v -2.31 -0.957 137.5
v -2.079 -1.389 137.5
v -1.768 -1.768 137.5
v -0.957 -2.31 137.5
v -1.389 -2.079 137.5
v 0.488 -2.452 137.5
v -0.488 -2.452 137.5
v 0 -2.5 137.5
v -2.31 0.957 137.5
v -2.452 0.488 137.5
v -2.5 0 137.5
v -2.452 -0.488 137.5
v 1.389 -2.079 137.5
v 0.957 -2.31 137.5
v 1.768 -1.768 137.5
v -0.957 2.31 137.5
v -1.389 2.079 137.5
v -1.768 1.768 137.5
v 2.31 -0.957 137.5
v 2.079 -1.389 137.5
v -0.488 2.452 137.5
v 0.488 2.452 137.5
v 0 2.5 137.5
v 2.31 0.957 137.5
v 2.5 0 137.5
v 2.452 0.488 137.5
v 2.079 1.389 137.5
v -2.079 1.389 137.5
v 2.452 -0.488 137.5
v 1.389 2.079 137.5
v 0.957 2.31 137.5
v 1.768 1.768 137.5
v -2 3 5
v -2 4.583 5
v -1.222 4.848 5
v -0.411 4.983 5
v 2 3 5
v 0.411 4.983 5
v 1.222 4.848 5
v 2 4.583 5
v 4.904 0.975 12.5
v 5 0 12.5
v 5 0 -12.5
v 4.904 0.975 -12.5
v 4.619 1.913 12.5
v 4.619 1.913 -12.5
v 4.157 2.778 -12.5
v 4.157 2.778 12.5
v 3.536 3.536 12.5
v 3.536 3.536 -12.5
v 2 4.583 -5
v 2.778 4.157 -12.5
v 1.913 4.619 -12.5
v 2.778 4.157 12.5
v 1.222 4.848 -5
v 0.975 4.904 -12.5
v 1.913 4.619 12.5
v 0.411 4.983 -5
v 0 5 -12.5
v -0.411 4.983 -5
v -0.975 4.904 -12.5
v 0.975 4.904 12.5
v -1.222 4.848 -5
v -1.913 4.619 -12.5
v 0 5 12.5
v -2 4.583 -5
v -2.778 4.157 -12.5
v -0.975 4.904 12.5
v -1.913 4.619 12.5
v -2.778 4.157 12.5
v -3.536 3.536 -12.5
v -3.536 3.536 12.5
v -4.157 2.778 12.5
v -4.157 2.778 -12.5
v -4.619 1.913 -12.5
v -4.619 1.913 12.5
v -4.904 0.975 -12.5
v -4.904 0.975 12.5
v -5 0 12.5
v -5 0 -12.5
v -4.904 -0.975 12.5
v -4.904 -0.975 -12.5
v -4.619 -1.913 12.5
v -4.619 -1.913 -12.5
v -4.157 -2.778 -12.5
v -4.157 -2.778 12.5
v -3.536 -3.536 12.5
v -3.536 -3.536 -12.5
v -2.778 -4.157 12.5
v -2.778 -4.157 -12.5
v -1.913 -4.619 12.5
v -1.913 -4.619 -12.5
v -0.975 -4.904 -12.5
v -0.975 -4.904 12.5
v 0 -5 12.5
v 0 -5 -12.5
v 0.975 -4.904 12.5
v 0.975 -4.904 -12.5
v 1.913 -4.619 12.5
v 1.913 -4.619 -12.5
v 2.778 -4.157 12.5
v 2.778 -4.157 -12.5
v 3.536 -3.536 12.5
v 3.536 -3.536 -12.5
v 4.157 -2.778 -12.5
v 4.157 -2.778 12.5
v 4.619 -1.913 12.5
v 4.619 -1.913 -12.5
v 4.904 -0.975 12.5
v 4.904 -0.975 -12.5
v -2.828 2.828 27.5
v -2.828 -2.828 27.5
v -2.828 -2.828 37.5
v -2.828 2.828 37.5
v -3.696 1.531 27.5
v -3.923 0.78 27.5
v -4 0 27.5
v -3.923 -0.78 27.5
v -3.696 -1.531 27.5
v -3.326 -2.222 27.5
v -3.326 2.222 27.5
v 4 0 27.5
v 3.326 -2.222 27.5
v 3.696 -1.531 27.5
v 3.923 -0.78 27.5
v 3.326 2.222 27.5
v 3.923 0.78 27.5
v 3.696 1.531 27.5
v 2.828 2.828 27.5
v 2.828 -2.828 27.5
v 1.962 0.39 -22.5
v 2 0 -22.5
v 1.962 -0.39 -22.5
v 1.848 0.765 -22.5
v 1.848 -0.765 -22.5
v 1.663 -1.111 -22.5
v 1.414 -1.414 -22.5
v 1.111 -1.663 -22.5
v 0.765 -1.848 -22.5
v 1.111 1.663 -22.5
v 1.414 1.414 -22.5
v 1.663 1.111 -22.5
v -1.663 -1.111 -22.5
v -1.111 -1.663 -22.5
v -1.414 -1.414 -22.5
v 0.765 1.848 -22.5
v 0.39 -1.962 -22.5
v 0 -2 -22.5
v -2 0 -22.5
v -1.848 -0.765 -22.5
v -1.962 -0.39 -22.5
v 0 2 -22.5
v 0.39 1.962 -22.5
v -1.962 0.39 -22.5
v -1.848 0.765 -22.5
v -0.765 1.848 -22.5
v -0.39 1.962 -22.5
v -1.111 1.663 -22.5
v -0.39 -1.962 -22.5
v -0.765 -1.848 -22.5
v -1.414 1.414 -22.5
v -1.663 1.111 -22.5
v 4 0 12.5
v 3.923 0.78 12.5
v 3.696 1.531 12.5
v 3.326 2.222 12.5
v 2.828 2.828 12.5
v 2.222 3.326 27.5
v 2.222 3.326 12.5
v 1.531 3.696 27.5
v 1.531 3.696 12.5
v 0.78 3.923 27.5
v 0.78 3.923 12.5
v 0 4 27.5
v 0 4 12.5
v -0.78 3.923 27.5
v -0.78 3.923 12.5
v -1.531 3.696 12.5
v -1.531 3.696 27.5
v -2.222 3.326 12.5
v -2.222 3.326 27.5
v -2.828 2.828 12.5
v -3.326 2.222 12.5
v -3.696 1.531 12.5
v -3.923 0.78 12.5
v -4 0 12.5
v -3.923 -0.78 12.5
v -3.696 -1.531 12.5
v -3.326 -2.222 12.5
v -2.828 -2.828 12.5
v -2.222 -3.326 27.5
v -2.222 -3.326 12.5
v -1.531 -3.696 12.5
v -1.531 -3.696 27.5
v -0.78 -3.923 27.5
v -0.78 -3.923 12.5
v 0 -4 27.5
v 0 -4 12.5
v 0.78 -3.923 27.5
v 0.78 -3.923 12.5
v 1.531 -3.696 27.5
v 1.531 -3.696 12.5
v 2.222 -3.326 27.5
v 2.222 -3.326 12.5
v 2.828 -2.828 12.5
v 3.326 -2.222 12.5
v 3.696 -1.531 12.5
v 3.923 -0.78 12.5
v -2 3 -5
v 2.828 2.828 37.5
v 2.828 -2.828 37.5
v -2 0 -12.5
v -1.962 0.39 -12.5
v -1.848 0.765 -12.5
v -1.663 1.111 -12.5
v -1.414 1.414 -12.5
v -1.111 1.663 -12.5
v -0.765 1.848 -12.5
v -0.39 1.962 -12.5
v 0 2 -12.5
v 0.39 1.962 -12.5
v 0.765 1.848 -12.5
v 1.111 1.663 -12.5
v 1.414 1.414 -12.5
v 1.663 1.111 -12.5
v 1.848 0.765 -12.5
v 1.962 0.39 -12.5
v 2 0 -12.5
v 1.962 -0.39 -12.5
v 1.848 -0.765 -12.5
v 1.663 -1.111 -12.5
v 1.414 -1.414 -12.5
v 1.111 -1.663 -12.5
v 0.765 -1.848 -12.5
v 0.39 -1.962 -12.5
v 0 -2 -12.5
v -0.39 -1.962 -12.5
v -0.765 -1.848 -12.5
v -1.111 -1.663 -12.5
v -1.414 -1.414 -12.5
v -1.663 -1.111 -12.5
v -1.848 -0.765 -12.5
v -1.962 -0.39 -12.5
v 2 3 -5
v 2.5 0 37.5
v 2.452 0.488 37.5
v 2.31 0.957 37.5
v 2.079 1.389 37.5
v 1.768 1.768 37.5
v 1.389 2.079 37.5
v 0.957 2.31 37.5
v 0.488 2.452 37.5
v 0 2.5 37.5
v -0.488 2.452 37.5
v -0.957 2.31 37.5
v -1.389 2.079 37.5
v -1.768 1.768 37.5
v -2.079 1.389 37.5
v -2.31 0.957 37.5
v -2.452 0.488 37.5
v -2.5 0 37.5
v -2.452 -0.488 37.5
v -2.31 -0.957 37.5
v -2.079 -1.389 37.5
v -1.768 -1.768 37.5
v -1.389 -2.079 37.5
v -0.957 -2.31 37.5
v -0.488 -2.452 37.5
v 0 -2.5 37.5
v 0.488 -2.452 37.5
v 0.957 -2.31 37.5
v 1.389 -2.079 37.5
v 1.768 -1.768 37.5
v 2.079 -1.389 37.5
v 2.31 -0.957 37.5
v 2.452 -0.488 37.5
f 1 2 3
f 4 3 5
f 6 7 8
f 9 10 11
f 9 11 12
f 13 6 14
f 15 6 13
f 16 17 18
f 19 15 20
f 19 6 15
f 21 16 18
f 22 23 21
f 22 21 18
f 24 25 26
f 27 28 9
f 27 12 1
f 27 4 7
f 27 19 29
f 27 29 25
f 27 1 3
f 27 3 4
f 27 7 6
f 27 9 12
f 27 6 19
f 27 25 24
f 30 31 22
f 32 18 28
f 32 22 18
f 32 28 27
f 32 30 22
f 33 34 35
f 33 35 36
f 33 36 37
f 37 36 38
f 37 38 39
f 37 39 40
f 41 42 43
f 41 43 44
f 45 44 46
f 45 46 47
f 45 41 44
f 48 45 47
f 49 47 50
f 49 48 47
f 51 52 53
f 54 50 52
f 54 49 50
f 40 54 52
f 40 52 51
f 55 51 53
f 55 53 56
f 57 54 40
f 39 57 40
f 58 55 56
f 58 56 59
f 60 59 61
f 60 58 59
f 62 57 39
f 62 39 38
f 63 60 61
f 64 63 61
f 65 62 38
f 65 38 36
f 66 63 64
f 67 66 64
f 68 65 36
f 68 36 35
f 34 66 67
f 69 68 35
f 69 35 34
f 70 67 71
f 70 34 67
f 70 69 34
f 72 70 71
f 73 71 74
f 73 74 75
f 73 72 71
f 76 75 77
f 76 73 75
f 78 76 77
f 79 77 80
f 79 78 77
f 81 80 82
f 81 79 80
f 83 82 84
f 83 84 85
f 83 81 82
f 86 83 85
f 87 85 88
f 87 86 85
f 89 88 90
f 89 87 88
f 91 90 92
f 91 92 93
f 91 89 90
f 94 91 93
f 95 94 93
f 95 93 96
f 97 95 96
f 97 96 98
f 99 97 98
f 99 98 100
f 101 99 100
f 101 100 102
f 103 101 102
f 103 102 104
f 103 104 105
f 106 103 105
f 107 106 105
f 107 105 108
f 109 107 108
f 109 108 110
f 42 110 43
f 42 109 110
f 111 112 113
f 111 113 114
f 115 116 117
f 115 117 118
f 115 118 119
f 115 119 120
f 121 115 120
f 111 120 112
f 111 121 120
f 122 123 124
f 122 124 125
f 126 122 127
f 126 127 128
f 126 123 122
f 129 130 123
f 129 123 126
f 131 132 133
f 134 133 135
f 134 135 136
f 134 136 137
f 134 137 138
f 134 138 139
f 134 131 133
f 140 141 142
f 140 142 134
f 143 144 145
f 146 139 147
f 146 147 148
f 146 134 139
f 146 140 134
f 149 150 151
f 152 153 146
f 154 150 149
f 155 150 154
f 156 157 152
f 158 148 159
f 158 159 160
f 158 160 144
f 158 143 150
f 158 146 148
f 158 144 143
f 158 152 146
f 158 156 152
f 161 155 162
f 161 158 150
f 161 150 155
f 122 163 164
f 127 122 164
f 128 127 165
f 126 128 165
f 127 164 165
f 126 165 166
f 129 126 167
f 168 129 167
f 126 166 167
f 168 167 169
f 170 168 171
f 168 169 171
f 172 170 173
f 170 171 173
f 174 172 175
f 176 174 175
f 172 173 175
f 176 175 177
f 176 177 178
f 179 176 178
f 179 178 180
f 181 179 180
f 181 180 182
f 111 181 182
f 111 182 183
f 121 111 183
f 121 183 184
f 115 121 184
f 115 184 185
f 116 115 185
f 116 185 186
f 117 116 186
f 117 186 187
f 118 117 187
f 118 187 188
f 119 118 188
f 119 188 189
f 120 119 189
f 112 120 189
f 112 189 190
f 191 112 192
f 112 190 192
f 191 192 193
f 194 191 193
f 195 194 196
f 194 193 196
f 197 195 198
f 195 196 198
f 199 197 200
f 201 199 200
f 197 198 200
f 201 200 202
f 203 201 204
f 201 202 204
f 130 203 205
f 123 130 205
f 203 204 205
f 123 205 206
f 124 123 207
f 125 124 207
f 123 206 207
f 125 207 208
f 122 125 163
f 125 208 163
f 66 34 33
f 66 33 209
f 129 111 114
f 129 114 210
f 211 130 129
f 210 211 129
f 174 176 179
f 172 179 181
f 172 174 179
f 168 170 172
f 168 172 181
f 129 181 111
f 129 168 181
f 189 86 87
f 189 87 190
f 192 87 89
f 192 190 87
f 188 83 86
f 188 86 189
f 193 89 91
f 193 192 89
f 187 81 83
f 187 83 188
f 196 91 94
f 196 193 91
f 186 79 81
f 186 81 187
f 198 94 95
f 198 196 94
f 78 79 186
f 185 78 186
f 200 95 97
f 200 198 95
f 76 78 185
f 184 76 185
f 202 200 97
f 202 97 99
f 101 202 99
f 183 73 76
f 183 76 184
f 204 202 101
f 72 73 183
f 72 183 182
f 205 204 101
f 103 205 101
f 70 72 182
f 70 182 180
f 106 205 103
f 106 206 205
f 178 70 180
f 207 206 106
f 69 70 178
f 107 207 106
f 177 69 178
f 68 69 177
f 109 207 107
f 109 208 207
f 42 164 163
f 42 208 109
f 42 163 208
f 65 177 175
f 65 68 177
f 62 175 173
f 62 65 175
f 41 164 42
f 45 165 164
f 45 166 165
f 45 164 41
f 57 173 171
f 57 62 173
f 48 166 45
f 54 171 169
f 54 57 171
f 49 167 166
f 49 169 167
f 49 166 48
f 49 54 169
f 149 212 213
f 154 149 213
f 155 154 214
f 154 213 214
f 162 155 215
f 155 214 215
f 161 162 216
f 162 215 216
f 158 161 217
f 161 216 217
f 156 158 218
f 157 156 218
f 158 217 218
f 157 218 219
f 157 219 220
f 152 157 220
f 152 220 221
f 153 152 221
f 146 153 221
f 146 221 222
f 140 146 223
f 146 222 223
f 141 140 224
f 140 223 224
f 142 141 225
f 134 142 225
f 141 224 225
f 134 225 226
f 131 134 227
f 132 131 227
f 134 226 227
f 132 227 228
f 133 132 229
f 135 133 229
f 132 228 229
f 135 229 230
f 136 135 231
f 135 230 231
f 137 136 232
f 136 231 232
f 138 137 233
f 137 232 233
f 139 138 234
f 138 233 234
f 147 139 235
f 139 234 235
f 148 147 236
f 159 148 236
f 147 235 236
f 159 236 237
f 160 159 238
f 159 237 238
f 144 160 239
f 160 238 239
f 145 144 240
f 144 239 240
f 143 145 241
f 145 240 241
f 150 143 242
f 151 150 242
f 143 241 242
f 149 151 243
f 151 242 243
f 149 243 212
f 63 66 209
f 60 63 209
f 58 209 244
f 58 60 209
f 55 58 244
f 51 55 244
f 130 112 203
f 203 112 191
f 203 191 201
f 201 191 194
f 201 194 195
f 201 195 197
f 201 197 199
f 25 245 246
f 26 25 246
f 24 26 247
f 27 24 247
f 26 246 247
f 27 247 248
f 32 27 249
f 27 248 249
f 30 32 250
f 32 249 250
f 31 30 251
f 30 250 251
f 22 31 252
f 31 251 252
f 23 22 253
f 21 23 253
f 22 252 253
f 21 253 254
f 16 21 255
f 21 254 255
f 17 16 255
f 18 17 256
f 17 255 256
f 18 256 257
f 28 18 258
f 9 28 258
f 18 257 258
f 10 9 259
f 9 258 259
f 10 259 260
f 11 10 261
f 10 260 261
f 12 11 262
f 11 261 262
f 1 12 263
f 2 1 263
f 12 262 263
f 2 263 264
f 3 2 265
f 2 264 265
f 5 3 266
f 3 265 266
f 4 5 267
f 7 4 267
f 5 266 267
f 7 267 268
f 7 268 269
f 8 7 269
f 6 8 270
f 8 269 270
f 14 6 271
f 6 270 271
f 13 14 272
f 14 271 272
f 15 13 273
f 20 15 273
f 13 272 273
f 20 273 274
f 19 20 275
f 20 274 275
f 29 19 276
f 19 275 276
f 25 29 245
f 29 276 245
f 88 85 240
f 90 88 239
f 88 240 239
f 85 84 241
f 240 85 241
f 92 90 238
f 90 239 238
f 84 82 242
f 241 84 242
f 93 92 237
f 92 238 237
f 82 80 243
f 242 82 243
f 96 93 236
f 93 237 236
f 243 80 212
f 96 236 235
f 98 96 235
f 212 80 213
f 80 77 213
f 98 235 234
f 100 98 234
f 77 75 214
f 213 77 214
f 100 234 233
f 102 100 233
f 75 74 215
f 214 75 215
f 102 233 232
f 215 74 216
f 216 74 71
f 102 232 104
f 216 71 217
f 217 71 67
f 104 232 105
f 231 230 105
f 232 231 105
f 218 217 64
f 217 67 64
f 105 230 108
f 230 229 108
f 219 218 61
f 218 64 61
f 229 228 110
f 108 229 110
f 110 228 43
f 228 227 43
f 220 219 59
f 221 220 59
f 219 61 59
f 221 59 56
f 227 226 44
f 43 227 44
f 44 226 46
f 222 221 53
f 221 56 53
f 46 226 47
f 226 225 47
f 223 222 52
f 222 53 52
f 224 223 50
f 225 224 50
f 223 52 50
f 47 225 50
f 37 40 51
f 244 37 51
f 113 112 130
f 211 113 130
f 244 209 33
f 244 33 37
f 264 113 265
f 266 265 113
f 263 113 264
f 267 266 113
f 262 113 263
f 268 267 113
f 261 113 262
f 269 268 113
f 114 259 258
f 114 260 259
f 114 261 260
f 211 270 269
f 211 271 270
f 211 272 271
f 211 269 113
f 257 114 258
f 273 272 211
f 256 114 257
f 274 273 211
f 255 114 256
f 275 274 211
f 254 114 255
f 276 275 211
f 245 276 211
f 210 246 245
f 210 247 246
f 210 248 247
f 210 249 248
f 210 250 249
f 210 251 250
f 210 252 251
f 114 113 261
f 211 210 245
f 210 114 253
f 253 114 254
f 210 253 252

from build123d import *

# Parameters (mm, degrees)
CROQUIS1_R              = 5
SALIENTE_EXTRUIR1_DEPTH = 12.5
CROQUIS2_R              = 2
SALIENTE_EXTRUIR2_DEPTH = 10
CROQUIS3_R              = 4
SALIENTE_EXTRUIR3_DEPTH = 15
CROQUIS4_W              = 5.65685425
CROQUIS4_H              = 5.65685425
SALIENTE_EXTRUIR4_DEPTH = 10
CROQUIS5_W              = 4
CROQUIS5_H              = 10
CORTAR_EXTRUIR1_DEPTH   = 2
CROQUIS6_R              = 2.5
SALIENTE_EXTRUIR5_DEPTH = 100


with BuildPart() as part:
    # Croquis1 → Saliente-Extruir1 (new, symmetric)
    with BuildSketch(Plane.XY):
        Circle(CROQUIS1_R)
    extrude(amount=SALIENTE_EXTRUIR1_DEPTH, both=True)

    # Croquis2 → Saliente-Extruir2 (add)
    with BuildSketch(Plane(origin=(0, 0, -12.5), x_dir=(-1, 0, 0), z_dir=(0, 0, -1))):
        Circle(CROQUIS2_R)
    extrude(amount=SALIENTE_EXTRUIR2_DEPTH)

    # Croquis3 → Saliente-Extruir3 (add)
    with BuildSketch(Plane.XY.offset(12.5)):
        Circle(CROQUIS3_R)
    extrude(amount=SALIENTE_EXTRUIR3_DEPTH)

    # Croquis4 → Saliente-Extruir4 (add)
    with BuildSketch(Plane.XY.offset(27.5)):
        Rectangle(CROQUIS4_W, CROQUIS4_H)
    extrude(amount=SALIENTE_EXTRUIR4_DEPTH)

    # Croquis5 → Cortar-Extruir1 (cut)
    with BuildSketch(Plane(origin=(0, 5, 0), x_dir=(1, 0, 0), z_dir=(0, 1, 0))):
        Rectangle(CROQUIS5_W, CROQUIS5_H)
    extrude(amount=-CORTAR_EXTRUIR1_DEPTH, mode=Mode.SUBTRACT)

    # Croquis6 → Saliente-Extruir5 (add)
    with BuildSketch(Plane.XY.offset(37.5)):
        Circle(CROQUIS6_R)
    extrude(amount=SALIENTE_EXTRUIR5_DEPTH)


solid = part.part
